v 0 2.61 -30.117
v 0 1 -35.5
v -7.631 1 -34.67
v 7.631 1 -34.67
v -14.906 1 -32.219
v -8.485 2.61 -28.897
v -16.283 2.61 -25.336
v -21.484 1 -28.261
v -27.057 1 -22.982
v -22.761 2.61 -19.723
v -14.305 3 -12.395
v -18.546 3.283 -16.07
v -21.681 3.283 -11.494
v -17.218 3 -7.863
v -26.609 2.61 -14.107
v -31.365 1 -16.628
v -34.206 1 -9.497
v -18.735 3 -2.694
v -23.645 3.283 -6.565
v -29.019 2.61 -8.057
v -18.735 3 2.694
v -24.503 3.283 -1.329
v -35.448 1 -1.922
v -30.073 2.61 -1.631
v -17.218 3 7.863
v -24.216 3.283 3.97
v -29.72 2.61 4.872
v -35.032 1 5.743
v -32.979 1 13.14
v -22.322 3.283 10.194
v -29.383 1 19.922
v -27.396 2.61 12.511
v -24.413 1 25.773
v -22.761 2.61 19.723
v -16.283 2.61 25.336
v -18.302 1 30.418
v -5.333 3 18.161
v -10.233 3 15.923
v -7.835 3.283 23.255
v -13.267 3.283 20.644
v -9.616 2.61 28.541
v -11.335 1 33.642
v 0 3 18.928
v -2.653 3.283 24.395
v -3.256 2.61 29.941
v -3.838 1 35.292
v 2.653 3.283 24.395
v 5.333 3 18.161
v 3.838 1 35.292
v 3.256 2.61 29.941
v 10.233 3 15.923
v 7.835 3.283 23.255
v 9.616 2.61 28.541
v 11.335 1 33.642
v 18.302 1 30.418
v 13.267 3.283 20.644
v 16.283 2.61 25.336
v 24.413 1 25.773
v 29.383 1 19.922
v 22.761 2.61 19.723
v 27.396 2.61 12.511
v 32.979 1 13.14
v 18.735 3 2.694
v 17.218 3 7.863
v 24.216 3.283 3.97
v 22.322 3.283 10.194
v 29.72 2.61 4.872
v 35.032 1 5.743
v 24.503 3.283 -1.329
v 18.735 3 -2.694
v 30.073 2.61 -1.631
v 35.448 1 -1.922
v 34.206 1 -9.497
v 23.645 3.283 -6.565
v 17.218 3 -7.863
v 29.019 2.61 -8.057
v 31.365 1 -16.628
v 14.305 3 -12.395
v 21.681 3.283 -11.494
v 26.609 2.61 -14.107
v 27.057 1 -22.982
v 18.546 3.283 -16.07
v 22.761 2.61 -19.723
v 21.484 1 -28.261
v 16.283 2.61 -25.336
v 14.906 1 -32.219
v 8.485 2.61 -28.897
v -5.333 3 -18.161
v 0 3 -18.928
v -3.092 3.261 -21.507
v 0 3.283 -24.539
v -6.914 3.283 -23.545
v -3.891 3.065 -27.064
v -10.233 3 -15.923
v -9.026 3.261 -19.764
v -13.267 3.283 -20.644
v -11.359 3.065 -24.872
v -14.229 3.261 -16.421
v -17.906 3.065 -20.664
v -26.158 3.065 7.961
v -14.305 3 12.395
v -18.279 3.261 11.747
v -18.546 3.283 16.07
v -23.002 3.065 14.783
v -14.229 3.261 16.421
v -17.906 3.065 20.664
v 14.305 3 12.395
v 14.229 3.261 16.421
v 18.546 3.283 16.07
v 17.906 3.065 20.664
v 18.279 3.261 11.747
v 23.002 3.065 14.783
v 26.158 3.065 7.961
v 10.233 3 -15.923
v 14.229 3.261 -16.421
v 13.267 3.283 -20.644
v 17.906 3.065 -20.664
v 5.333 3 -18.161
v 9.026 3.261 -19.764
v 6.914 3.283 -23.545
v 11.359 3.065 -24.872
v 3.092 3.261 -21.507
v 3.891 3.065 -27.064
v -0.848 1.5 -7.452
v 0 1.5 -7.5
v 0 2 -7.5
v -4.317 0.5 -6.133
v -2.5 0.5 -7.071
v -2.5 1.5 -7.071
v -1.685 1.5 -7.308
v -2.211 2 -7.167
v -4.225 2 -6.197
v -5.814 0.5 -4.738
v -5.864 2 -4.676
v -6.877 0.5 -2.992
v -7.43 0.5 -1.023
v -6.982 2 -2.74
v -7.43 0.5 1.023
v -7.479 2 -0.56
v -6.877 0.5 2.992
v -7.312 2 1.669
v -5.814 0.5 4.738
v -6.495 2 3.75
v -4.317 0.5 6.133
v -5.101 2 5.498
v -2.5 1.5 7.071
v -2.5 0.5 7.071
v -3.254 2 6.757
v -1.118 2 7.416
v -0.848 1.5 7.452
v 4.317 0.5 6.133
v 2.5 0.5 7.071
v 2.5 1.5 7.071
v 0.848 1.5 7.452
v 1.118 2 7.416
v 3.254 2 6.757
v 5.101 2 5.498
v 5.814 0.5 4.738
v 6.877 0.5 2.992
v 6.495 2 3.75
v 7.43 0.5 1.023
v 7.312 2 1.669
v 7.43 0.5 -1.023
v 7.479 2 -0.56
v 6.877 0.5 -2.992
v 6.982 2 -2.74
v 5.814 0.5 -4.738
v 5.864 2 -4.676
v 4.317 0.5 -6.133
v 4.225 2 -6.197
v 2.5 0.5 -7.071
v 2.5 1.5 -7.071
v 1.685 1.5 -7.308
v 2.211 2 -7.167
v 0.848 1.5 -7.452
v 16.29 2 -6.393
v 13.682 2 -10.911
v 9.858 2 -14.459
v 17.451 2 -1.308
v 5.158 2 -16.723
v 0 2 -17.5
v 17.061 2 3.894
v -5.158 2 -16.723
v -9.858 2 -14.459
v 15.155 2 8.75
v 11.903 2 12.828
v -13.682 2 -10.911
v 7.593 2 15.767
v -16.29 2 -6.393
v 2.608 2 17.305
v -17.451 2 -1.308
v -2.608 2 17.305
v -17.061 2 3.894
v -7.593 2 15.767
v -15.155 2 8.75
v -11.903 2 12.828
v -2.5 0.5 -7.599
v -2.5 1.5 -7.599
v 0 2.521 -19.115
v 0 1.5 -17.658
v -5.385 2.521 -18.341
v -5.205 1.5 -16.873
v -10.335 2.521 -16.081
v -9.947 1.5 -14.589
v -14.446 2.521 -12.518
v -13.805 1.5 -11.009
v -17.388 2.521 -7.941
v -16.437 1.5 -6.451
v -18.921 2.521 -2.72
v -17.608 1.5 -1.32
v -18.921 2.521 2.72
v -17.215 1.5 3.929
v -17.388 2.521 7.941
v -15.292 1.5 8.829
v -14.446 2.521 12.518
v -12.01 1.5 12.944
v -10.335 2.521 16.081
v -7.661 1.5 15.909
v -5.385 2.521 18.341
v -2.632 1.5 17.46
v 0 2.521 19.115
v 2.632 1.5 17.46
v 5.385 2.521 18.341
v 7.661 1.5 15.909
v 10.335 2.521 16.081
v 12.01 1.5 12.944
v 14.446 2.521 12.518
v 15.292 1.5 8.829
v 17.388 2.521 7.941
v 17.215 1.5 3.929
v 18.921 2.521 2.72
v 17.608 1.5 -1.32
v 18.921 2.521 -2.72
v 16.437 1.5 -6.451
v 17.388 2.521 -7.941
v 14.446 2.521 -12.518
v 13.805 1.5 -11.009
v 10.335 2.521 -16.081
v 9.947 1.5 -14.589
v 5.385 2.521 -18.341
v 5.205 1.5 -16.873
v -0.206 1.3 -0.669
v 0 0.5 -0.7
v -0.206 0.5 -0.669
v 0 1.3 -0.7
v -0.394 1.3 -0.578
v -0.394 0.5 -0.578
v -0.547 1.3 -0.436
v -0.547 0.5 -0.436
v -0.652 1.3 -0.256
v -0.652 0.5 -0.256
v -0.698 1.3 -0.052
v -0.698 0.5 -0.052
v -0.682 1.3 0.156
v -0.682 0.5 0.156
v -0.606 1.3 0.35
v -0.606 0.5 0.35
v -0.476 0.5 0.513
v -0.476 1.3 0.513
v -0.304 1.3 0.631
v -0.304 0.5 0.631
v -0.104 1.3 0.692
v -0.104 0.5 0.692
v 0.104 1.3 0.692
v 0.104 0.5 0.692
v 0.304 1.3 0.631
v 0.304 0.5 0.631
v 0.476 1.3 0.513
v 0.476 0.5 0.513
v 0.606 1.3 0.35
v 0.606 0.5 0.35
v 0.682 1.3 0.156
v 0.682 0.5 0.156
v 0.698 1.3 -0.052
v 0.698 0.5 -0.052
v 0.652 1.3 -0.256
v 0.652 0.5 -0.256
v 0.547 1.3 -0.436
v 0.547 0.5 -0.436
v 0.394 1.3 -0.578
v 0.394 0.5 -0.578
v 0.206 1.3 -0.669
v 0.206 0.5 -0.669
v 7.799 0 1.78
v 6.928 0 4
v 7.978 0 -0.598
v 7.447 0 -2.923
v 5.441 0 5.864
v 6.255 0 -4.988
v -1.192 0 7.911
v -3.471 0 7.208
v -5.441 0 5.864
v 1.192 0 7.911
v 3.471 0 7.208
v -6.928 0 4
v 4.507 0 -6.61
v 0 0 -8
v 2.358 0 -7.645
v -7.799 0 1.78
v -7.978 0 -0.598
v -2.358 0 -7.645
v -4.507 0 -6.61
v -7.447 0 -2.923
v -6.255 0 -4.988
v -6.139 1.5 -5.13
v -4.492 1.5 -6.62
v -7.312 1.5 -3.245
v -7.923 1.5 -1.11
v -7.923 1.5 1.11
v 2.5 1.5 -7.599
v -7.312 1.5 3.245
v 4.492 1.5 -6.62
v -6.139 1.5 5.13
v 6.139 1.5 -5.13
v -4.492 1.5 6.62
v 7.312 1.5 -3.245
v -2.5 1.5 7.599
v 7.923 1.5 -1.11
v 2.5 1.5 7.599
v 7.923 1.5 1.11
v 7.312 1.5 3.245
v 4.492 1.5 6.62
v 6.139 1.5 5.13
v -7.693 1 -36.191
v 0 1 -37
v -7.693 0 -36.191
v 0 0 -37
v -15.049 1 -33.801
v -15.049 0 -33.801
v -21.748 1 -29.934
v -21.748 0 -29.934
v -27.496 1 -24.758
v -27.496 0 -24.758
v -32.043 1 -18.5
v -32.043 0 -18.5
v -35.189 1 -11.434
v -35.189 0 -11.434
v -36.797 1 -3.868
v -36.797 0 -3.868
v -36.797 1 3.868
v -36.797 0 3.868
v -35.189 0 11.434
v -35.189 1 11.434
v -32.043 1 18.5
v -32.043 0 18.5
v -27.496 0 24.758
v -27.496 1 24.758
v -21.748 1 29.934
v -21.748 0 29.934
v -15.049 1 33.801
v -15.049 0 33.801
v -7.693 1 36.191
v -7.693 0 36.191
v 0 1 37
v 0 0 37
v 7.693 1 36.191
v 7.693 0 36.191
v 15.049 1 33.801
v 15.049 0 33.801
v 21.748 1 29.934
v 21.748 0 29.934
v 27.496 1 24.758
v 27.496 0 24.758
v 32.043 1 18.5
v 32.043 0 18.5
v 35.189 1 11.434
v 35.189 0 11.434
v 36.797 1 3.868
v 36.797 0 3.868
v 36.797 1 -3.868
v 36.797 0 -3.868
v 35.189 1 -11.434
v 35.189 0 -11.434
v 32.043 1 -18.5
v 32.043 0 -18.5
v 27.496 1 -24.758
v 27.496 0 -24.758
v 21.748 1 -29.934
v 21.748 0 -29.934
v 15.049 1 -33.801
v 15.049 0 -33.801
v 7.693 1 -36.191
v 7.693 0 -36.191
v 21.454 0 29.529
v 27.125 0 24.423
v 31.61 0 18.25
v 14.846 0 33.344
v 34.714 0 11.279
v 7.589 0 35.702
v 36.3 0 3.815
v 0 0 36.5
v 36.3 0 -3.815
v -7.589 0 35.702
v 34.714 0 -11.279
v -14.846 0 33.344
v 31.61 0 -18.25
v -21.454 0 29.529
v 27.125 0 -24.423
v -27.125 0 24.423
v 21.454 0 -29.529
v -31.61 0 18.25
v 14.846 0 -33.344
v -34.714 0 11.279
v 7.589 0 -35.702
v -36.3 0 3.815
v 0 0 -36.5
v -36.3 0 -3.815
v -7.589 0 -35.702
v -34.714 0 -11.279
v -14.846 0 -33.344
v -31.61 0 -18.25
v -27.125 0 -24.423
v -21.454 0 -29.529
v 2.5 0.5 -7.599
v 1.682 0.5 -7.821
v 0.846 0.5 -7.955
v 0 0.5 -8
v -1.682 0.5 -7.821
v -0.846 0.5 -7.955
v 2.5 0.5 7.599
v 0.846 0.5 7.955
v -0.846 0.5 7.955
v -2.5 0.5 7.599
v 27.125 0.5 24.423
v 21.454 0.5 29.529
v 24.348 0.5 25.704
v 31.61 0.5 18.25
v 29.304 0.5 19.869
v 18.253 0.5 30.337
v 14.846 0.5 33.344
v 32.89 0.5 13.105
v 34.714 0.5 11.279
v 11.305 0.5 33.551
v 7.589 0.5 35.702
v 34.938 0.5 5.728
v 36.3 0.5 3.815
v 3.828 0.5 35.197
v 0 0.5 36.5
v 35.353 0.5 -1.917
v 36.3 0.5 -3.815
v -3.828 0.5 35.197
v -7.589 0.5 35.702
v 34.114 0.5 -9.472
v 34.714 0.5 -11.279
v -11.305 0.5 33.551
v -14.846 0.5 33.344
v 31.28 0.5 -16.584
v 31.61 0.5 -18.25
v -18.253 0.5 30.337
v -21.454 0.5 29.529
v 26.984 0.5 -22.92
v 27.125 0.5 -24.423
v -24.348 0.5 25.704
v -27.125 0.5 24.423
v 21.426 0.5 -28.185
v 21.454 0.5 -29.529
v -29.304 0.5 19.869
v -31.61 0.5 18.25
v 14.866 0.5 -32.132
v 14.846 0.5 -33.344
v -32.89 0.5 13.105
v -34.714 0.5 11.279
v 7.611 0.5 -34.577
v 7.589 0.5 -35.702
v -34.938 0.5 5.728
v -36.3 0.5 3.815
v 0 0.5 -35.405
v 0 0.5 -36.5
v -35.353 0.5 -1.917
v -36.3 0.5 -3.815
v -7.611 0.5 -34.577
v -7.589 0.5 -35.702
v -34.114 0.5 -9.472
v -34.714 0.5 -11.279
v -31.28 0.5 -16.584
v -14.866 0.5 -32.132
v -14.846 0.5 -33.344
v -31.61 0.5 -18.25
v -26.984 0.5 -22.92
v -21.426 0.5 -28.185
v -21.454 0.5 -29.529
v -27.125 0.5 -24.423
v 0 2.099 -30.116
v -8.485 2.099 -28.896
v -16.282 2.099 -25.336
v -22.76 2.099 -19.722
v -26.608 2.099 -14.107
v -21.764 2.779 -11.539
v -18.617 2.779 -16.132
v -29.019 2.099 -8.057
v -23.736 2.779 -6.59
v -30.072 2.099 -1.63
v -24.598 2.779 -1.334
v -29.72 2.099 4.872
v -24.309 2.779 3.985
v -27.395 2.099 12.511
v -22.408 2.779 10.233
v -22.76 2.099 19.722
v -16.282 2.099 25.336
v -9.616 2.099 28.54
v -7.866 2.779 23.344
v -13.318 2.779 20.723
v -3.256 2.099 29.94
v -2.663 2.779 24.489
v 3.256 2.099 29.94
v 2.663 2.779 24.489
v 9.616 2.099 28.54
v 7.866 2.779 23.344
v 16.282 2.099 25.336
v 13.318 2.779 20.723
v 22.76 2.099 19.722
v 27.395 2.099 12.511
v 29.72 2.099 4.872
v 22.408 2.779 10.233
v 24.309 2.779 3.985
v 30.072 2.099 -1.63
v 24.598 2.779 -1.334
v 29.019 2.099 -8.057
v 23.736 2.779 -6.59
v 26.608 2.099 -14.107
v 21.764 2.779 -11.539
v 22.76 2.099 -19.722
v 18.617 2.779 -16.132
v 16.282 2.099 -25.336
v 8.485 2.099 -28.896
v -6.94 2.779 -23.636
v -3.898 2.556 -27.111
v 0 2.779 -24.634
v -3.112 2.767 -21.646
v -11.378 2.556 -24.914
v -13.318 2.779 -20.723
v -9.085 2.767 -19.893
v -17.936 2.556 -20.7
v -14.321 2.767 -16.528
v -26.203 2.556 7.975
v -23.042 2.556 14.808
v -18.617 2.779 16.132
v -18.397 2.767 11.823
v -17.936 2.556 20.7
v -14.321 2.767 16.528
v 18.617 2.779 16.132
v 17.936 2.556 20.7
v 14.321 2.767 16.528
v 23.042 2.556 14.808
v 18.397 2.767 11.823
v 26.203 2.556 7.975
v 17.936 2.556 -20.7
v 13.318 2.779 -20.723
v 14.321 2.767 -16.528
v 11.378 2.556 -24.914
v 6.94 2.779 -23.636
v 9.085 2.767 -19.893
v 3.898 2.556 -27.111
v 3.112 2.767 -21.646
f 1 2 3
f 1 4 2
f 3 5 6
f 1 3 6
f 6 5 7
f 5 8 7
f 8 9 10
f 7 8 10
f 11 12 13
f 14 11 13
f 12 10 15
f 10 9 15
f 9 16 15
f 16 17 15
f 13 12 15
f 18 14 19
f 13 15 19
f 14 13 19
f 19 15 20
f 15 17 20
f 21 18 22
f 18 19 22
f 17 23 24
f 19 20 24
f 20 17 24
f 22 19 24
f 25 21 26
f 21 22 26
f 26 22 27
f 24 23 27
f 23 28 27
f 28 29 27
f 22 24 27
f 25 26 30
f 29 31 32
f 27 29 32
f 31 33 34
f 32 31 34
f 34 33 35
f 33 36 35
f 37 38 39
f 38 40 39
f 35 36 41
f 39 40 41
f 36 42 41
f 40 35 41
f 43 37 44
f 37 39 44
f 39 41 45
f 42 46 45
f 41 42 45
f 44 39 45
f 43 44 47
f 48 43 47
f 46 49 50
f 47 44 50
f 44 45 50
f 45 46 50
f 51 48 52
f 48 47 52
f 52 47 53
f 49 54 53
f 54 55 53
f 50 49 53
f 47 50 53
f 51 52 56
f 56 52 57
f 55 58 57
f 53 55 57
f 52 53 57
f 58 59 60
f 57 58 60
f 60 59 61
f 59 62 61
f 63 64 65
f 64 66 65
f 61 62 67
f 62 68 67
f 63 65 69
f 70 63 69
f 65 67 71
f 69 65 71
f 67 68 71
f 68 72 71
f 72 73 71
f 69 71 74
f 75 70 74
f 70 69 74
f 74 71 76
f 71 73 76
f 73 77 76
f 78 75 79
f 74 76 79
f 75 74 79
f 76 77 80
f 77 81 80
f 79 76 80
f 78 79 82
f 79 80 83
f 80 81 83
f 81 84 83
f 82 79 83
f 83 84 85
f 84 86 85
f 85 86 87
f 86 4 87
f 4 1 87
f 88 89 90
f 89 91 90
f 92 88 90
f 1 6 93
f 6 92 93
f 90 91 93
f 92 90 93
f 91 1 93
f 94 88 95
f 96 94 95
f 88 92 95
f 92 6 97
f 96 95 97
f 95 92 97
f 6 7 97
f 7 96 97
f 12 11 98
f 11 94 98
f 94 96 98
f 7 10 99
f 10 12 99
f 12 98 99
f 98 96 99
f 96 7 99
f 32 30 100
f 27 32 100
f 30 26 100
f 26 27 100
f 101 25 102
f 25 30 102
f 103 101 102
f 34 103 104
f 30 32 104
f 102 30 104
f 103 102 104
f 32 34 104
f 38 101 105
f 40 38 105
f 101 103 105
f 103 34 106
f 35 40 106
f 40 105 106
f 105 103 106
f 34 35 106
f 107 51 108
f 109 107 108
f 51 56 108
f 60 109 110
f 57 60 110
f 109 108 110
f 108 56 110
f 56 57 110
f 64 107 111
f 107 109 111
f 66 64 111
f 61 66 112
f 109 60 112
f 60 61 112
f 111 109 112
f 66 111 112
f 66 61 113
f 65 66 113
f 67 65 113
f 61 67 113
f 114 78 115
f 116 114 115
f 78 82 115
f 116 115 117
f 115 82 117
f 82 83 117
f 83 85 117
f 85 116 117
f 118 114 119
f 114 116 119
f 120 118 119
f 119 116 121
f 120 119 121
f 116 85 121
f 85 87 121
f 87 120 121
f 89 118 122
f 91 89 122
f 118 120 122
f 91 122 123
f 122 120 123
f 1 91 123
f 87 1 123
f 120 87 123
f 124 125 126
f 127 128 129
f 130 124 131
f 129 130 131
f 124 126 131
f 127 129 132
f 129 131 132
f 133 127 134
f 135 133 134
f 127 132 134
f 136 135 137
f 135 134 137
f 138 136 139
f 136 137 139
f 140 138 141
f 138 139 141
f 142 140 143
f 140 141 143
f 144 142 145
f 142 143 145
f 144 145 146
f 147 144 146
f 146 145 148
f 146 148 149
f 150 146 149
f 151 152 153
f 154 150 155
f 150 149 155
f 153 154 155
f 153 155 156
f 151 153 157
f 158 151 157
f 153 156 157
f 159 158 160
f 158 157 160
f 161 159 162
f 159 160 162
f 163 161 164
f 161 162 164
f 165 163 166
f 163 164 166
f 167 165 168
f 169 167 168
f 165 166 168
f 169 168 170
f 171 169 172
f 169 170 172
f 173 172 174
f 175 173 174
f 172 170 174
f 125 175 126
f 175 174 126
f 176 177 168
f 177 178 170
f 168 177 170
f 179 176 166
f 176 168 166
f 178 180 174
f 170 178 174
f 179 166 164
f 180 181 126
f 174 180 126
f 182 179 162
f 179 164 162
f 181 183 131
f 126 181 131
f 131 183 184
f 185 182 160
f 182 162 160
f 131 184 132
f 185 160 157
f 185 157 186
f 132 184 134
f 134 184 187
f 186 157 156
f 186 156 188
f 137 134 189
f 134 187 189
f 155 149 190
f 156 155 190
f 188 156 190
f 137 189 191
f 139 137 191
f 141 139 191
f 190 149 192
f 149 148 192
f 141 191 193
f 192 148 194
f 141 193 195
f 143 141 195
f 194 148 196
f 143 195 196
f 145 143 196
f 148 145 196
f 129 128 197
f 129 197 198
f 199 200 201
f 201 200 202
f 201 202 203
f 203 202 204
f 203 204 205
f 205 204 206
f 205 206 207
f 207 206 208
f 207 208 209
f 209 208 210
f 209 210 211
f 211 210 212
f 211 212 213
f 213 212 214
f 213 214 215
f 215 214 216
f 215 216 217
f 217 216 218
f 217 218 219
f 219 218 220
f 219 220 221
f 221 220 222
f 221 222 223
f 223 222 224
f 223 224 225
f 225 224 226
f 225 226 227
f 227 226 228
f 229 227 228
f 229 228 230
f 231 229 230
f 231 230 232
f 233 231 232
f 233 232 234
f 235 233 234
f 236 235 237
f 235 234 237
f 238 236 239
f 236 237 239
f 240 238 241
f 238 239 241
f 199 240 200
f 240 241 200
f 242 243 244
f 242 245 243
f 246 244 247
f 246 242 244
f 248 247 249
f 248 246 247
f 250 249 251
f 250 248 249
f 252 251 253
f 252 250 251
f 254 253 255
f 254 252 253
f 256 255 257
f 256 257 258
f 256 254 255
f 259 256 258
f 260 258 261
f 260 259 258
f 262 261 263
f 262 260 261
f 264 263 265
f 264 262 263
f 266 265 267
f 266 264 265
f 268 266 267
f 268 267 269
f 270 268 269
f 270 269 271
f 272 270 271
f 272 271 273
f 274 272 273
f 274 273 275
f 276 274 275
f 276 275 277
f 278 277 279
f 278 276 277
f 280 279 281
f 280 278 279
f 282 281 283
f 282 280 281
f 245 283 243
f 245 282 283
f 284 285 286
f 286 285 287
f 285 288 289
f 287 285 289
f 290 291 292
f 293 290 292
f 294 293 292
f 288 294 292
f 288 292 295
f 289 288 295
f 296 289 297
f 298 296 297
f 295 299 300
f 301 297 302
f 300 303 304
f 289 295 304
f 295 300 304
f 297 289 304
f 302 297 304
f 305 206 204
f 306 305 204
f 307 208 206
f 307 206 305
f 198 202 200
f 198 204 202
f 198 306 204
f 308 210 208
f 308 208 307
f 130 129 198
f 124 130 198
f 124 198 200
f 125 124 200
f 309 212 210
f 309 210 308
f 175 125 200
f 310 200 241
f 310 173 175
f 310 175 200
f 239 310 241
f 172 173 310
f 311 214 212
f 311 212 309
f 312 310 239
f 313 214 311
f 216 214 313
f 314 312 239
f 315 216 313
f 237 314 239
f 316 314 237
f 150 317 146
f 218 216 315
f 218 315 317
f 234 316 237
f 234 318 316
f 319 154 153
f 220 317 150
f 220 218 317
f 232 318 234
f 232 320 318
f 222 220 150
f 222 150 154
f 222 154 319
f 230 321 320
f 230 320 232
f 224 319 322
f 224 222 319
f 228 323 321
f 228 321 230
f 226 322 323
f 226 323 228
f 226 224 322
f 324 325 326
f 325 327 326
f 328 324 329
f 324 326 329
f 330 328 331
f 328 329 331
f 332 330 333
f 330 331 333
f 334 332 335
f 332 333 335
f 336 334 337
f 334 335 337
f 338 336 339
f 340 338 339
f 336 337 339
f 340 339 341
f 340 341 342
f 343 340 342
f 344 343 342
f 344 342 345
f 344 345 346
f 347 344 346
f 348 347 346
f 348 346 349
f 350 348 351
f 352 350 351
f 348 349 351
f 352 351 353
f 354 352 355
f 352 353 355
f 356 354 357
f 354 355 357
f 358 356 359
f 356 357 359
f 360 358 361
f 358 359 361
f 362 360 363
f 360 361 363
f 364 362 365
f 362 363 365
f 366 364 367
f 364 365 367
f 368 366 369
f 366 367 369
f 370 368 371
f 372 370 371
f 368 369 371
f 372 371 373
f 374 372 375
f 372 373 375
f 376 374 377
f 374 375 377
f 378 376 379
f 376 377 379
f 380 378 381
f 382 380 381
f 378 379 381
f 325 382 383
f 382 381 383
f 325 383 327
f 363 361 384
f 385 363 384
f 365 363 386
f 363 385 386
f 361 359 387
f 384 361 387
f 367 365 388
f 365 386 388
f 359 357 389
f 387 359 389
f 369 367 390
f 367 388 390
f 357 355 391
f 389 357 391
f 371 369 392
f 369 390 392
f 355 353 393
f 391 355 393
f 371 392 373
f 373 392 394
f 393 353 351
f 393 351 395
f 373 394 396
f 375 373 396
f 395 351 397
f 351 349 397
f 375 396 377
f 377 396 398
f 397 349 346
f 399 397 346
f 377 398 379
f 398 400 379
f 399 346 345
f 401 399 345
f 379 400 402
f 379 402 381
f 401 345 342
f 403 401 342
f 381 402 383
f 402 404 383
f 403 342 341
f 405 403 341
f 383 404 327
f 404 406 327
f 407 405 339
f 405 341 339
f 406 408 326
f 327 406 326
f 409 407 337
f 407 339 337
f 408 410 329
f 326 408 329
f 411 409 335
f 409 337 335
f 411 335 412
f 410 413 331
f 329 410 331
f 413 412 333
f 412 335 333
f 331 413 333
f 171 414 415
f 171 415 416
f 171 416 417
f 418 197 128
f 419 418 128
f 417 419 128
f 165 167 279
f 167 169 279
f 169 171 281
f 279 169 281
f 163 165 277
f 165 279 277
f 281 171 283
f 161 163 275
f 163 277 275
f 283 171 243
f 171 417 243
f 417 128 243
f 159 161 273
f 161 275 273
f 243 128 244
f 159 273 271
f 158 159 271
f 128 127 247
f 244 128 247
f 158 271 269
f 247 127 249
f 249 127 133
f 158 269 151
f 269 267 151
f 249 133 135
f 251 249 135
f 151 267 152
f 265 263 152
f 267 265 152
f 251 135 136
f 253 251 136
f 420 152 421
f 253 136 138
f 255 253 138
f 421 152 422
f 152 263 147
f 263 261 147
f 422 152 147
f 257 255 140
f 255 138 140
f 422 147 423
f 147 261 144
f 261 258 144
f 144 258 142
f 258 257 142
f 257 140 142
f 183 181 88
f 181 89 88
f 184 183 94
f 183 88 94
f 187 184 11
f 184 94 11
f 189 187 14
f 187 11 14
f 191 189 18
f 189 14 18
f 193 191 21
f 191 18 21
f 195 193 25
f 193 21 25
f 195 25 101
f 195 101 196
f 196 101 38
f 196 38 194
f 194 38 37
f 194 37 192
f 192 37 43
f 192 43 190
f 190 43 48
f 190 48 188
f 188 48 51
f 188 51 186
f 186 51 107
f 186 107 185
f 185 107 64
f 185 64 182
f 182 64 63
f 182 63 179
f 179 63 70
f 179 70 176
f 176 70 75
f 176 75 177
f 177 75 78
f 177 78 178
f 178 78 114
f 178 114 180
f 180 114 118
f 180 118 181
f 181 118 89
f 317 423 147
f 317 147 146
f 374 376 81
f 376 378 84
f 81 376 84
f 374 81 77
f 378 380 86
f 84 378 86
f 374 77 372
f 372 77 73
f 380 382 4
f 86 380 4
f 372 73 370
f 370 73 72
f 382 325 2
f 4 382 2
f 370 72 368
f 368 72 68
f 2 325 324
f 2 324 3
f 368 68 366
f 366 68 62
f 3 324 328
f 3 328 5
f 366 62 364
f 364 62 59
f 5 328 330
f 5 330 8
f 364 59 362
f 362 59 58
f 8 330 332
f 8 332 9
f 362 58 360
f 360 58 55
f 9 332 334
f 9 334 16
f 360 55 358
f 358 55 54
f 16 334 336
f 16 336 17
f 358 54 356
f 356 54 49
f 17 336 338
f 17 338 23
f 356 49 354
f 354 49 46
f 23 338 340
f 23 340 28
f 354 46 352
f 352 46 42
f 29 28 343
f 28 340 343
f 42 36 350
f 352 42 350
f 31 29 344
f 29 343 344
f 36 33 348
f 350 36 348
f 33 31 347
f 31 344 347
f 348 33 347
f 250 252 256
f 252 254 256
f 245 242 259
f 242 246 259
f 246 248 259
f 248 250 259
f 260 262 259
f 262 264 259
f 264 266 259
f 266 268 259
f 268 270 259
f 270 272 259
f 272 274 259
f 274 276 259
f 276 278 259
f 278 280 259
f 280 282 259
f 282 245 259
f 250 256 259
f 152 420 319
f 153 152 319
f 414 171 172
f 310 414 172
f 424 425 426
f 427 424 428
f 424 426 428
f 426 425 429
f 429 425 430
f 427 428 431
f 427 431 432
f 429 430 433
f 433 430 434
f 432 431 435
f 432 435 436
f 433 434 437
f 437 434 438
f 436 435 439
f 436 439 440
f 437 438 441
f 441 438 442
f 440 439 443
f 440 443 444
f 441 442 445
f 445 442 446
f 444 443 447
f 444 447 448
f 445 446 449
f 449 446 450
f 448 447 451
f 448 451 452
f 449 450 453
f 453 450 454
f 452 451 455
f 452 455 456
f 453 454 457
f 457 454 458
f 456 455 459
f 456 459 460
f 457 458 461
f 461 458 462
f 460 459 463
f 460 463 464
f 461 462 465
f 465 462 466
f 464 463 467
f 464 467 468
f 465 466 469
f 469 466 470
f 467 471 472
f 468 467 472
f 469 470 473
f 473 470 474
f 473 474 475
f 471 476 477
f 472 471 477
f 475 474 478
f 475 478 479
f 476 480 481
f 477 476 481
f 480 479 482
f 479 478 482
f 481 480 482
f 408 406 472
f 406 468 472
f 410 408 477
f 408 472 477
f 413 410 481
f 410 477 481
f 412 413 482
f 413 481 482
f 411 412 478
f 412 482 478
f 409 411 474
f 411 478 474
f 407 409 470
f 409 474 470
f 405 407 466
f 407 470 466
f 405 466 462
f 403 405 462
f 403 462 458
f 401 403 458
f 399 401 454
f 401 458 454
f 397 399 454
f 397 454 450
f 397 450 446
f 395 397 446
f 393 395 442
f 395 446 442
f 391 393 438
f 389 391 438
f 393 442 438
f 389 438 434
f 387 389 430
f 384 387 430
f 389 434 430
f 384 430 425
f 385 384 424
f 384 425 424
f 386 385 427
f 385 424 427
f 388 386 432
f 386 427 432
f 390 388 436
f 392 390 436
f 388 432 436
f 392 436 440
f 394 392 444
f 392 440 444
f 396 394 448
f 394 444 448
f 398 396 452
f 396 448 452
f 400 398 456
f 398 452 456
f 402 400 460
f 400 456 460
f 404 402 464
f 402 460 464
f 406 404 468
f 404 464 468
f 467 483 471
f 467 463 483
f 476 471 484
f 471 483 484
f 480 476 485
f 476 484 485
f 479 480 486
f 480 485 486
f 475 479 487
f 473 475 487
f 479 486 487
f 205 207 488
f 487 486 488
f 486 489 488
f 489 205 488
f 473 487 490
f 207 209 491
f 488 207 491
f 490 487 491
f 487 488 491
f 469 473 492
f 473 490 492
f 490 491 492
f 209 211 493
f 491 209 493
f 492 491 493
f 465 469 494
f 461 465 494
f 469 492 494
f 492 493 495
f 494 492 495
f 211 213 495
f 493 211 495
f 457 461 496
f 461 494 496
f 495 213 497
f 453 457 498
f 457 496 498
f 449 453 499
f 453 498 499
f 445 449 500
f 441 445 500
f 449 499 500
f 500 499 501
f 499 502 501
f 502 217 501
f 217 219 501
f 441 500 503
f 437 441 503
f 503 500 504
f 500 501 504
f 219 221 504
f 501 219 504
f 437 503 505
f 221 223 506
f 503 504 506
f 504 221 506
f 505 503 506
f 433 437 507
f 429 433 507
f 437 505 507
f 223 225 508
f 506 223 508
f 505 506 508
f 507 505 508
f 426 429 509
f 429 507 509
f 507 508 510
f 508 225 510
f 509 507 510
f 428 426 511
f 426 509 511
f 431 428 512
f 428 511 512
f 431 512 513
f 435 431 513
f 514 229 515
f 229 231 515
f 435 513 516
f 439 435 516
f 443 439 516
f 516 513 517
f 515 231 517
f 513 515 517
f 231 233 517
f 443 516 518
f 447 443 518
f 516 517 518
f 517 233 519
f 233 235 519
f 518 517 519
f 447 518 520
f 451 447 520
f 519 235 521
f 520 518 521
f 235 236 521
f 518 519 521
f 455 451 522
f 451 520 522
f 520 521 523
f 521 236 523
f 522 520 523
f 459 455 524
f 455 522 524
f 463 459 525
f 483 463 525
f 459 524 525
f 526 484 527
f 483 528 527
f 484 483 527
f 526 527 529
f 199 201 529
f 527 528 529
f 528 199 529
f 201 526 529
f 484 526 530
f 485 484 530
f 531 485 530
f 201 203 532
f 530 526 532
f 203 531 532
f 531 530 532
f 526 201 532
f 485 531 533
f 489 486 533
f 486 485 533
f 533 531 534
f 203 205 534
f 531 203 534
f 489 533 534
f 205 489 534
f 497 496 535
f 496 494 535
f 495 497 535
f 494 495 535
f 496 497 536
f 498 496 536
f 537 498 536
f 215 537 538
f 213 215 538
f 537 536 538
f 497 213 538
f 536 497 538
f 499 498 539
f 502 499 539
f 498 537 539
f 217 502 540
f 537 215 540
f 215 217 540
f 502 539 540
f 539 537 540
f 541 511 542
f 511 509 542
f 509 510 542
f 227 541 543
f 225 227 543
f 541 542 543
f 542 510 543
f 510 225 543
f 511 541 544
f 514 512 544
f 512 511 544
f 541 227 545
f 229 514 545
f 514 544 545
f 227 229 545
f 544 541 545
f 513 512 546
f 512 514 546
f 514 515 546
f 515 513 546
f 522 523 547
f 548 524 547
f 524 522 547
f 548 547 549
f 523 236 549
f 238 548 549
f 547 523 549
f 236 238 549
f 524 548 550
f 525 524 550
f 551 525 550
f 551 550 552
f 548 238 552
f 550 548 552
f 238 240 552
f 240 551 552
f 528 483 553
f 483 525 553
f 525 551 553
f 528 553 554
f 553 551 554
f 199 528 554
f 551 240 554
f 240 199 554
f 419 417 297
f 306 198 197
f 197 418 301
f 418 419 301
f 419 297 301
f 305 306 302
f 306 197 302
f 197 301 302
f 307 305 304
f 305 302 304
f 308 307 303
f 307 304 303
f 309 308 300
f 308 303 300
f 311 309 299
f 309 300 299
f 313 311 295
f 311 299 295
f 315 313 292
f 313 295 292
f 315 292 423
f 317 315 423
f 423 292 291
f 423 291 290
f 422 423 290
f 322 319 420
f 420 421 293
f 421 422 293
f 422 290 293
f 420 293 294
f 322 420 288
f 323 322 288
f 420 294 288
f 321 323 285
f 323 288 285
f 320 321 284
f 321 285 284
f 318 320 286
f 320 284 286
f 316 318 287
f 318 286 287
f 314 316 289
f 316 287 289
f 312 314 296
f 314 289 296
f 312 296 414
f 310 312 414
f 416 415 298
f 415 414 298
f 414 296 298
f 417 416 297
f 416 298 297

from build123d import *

# Parameters (mm, degrees)
SKETCH2_W          = 5
SKETCH2_H          = 1
CUT_EXTRUDE1_DEPTH = 15
SKETCH3_W          = 0.7
SKETCH3_H          = 0.8


with BuildPart() as part:
    # Sketch1 → Revolve1 (revolve)
    with BuildSketch(Plane.XY, mode=Mode.PRIVATE) as revolve1_sk:
        with BuildLine():
            Line((0, 0.5), (7.5, 0.5))
            Line((7.5, 0.5), (7.5, 2))
            Line((7.5, 2), (17.5, 2))
            Line((17.5, 2), (18.928148007, 3))
            ThreePointArc((18.928148007, 3), (27.342618843, 3.065113029), (35.5, 1))
            Line((35.5, 1), (37, 1))
            Line((37, 1), (37, 0))
            Line((37, 0), (36.5, 0))
            Line((36.5, 0), (36.5, 0.5))
            Line((36.5, 0.5), (35.404554146, 0.5))
            ThreePointArc((35.404554146, 0.5), (27.389609996, 2.555633943), (19.115328234, 2.520677712))
            Line((19.115328234, 2.520677712), (17.657649394, 1.5))
            Line((17.657649394, 1.5), (8, 1.5))
            Line((8, 1.5), (8, 0))
            Line((8, 0), (0, 0))
            Line((0, 0), (0, 0.5))
        make_face()
    revolve(revolve1_sk.sketch.rotate(Axis((0, 0, 0), (0, 1, 0)), 90), axis=Axis((0, 0, 0), (0, 1, 0)))

    # Sketch2 → Cut-Extrude1 (cut, symmetric)
    with BuildSketch(Plane.XY):
        with Locations((0, 1)):
            Rectangle(SKETCH2_W, SKETCH2_H)
    extrude(amount=CUT_EXTRUDE1_DEPTH, both=True, mode=Mode.SUBTRACT)

    # Sketch3 → Revolve2 (revolve)
    with BuildSketch(Plane.XY, mode=Mode.PRIVATE) as revolve2_sk:
        with Locations((0.35, 0.9)):
            Rectangle(SKETCH3_W, SKETCH3_H)
    revolve(revolve2_sk.sketch.rotate(Axis((0, 0.5, 0), (0, 1, 0)), 90), axis=Axis((0, 0.5, 0), (0, 1, 0)))


solid = part.part
